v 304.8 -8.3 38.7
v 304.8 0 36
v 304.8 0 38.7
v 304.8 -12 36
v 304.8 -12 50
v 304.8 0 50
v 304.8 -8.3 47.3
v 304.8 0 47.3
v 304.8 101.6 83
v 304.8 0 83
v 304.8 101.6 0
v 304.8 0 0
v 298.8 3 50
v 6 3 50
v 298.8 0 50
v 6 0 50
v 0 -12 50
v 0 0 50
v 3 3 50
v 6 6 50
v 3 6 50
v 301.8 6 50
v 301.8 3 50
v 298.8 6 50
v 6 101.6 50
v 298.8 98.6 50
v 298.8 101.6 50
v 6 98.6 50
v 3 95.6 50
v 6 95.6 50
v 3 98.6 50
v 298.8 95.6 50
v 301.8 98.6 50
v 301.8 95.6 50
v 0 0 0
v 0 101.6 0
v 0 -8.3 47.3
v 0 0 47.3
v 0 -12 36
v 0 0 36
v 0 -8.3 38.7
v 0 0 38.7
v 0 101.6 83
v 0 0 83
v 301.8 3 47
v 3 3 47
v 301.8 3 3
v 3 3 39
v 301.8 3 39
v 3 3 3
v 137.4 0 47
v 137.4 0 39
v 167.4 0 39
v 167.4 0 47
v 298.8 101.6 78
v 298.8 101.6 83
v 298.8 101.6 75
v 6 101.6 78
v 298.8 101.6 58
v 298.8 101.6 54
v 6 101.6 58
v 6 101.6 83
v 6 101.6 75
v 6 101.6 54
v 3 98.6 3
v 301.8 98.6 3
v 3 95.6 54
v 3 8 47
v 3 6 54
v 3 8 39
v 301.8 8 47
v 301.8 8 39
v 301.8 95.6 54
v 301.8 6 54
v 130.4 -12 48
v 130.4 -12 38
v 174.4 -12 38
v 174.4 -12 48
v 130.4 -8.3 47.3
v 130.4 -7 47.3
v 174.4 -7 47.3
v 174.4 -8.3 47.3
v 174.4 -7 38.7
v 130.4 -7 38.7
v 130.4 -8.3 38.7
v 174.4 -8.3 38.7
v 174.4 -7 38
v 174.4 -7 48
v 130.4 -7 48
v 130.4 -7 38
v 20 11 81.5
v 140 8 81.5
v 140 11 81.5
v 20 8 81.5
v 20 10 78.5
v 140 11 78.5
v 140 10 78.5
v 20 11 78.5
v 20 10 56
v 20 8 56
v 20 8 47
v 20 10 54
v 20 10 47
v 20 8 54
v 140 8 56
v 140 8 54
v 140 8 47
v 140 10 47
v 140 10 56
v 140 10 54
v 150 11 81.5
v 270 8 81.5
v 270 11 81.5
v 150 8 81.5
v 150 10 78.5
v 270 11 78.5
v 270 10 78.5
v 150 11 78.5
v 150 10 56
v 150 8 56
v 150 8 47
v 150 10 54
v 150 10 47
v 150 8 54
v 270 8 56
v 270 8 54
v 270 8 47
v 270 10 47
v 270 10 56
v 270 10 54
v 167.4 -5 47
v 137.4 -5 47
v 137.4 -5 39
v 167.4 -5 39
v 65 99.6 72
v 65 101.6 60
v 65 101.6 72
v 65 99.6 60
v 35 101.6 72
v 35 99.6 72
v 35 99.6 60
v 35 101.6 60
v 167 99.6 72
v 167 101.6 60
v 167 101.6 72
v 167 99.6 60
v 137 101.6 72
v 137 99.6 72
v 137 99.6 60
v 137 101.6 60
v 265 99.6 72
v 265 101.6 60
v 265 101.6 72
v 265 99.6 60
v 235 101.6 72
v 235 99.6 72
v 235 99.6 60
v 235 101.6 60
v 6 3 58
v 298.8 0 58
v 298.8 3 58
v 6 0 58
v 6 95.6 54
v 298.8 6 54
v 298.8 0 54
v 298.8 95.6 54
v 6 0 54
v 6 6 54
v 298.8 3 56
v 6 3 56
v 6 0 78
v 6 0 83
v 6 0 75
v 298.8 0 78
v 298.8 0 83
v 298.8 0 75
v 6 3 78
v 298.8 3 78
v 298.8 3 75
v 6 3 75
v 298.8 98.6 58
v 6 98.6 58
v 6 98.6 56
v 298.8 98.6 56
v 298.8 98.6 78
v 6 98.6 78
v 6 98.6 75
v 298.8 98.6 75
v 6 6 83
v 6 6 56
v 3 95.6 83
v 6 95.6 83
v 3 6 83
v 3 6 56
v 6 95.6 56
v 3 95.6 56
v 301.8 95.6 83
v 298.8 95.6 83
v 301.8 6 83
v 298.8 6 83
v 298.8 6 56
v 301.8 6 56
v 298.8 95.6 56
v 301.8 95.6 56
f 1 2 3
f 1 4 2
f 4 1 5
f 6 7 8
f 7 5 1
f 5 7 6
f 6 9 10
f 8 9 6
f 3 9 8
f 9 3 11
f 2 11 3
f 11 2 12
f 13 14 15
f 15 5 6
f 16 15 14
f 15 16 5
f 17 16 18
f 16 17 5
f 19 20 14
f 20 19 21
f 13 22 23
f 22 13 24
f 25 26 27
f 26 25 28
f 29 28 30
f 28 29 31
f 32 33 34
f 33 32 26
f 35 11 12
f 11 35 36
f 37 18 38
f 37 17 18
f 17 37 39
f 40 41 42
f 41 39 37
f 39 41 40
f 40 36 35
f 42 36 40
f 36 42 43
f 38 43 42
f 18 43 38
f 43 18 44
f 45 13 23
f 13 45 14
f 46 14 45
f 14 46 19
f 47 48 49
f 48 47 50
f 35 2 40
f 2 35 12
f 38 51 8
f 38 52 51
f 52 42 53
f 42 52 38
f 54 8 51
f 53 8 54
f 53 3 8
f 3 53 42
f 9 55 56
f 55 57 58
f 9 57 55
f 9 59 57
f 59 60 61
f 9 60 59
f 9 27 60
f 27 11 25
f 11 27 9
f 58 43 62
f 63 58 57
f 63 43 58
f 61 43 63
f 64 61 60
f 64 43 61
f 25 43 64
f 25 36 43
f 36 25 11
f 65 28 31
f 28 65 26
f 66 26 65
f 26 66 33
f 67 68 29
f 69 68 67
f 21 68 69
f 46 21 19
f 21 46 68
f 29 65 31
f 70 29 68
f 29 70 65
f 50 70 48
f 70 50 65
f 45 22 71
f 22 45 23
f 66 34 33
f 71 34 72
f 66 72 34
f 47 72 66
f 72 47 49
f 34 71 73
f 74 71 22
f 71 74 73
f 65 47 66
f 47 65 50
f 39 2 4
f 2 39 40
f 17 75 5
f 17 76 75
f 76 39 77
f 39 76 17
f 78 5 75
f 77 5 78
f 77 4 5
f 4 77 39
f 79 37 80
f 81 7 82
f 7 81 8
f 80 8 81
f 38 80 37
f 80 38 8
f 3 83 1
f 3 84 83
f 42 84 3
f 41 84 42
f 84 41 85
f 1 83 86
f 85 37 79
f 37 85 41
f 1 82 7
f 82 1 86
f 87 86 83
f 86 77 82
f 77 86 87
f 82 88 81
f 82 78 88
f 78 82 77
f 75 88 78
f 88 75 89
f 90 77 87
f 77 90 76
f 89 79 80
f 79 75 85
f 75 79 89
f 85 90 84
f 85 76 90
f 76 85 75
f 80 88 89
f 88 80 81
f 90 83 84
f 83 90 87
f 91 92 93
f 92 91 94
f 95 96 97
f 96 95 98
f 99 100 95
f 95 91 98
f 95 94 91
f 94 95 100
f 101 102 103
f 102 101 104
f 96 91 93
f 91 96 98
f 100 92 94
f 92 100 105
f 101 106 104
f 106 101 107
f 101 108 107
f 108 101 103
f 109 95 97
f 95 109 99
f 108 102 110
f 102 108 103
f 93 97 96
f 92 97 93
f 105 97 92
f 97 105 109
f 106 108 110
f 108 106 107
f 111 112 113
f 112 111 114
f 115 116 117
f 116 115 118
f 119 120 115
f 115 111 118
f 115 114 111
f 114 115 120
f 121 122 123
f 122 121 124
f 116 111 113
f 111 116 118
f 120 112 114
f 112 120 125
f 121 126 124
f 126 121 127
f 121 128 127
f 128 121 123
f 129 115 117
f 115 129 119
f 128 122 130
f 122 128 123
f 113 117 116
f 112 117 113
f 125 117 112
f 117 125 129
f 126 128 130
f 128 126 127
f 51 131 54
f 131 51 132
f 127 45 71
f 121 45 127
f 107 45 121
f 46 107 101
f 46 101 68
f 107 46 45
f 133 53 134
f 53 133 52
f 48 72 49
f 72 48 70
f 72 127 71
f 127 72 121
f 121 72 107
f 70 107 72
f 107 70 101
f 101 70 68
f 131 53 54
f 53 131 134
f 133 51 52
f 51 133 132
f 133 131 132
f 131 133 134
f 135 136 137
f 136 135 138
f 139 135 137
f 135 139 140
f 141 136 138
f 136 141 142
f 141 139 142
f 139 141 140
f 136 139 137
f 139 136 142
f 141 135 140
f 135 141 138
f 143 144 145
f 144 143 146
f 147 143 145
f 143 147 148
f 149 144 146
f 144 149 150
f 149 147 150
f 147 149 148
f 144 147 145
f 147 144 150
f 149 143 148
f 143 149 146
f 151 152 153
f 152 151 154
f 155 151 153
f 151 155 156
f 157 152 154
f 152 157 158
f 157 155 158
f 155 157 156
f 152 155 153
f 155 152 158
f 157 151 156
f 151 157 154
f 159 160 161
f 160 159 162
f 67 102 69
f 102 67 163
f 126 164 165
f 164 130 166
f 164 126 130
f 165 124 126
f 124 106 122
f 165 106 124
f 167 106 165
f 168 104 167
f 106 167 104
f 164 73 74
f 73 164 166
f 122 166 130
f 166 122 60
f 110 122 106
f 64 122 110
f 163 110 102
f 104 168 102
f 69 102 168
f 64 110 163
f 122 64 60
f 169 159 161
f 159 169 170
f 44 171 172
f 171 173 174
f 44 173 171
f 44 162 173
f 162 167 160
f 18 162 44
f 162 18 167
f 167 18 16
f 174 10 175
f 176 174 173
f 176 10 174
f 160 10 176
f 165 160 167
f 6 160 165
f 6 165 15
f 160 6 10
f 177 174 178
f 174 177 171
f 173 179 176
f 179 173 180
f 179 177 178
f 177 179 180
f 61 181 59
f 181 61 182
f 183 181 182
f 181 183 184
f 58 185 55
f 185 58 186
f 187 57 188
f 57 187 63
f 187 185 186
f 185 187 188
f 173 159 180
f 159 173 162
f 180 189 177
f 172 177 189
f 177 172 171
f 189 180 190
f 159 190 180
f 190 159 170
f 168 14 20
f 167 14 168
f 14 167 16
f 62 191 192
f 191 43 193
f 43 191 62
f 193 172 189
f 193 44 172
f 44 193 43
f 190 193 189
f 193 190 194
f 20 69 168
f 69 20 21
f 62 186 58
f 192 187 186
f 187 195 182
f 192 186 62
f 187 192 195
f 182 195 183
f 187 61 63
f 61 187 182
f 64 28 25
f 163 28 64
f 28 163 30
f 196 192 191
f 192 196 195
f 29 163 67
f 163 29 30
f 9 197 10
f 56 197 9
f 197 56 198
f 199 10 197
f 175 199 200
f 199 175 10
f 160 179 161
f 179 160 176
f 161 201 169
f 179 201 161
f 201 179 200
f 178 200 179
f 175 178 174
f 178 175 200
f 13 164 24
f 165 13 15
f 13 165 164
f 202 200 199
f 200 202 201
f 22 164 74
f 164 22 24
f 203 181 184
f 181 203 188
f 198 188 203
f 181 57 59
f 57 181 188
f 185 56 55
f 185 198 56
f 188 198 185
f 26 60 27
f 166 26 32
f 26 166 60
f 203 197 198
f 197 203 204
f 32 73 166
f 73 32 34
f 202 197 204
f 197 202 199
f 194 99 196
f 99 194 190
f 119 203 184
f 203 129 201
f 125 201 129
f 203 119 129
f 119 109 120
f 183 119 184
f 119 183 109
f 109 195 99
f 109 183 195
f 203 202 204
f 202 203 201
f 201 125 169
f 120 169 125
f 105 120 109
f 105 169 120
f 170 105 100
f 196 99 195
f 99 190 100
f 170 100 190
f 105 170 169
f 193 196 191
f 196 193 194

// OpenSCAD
// file: ../top_ref.scad
// top_ref.scad  — FAITHFUL reference of the real uploaded top tray (L3.stl)
// Extracted from L3.stl by voxel analysis. Coordinates: new-tray top face = z=0 here,
// call top_ref(base=50) to seat it on a 50mm-tall new tray.
// DO NOT MODIFY THIS PART IN ANY DESIGN — it represents an already-printed tray.
//
// Real dims: 304.8 (X) x 101.6 (Y) x 33 (Z).
//  - END walls (short, x=0..3 and 301.8..304.8): SOLID full height -> top at z=33 (seated 83)
//  - LONG sides (front y=0..3, back y=98.6..101.6): OPEN FRAME
//        bottom rail z=4..8, top rail z=25..28, OPEN between (z=9..24)
//        side top edge at z=28 (seated 78)
//  - Corners: full height to z=33 (seated 83)
//  - Floor plate: z=4..6
// Seated mapping (base=50): add 50 to every z below.

TR_X = 304.8;
TR_Y = 101.6;
TR_Z = 33;
TR_wall = 3;        // side/end wall thickness
TR_endw = 3;        // short-end wall thickness
TR_botrail_z0 = 4;  TR_botrail_z1 = 8;     // long-side bottom rail
TR_toprail_z0 = 25; TR_toprail_z1 = 28;    // long-side top rail (side top edge=28)
TR_floor_z0 = 4;    TR_floor_z1 = 6;
TR_corner = 6;      // corner post footprint (x & y) kept full height

module top_ref(base=50, col="#90A4AE", alpha=1.0) {
    color(col, alpha)
    translate([0,0,base])
    union() {
        // ---- floor plate ----
        translate([TR_endw, TR_wall, TR_floor_z0])
            cube([TR_X-2*TR_endw, TR_Y-2*TR_wall, TR_floor_z1-TR_floor_z0]);
        // ---- two short END walls: full height ----
        cube([TR_endw, TR_Y, TR_Z]);
        translate([TR_X-TR_endw,0,0]) cube([TR_endw, TR_Y, TR_Z]);
        // ---- long-side OPEN FRAMES (front & back) ----
        for (yy=[0, TR_Y-TR_wall]) {
            // bottom rail
            translate([0, yy, TR_botrail_z0]) cube([TR_X, TR_wall, TR_botrail_z1-TR_botrail_z0]);
            // top rail (side top edge)
            translate([0, yy, TR_toprail_z0]) cube([TR_X, TR_wall, TR_toprail_z1-TR_toprail_z0]);
        }
        // ---- corner posts full height (tie frames together, reach z=33) ----
        for (xx=[0, TR_X-TR_corner], yy=[0, TR_Y-TR_corner])
            translate([xx,yy,0]) cube([TR_corner, TR_corner, TR_Z]);
    }
}

// Convenience constants a design can reference (seated, base=50):
//   END-wall top edge:        z = 50+33 = 83  (over the short ends -> strong clamp)
//   Long-side top rail top:   z = 50+28 = 78  (hook over / under along front)
//   Long-side open slot:      z = 50+9 .. 50+24 = 59..74 (reach a tongue in anywhere)
//   Corner top:               z = 83
// main file
// 01_pushbar.scad — Multipoint Push-Bar Slide-Bolt
// Place-then-secure: lower top tray straight down (loose, ~0.6mm), then push the
// front bar +Y to drive tongues ABOVE the front top-rail (seated z=75..78),
// blocking any lift once locked.
//
// Capture logic:
//   - Top tray front top-rail seated at y=0..3, z=75..78 (solid)
//   - Above the top rail at y=0..3, z=78..83 is EMPTY (between rail top and corner top)
//   - Tongue tip sits at z=78.5 (0.5mm clear of rail top) in that empty space
//   - On +2mm lift the top rail moves to z=77..80: tongue at z=78.5..80.5 overlaps
//   - In UNLOCKED: tongue retracts to y<0 (outside tray) → zero overlap

show  = "all";  // [all, new, top]
lock  = 1;      // 0=unlocked  1=locked

include <../top_ref.scad>

// ── Tray dims ──────────────────────────────────────────────────────────────
T_X   = 304.8;
T_Y   = 101.6;
T_Z   = 50;
T_W   = 3;

// ── Bar / housing ─────────────────────────────────────────────────────────
// Housing sits on the front face of the new tray (y=0..3 is the front wall)
// Housing block: y = -12..0,  z = 36..50
HSG_D    = 12;      // depth in -Y
HSG_H    = 14;      // height
HSG_Z0   = T_Z - HSG_H;     // = 36
BAR_D    = 8;       // bar depth in Y
BAR_H    = 8;       // bar height
BAR_CLR  = 0.3;     // print-in-place clearance
BAR_Z0   = HSG_Z0 + (HSG_H - BAR_H) / 2;  // = 39
BAR_TRAVEL = 8;     // mm of +Y push to lock

lock_dy  = lock ? BAR_TRAVEL : 0;

// ── Tongue geometry ────────────────────────────────────────────────────────
// The tongue is a thin vertical blade that rides on the bar.
// Stem (below tray top = z<50): stays at y=-12..bar_front → no overlap with top tray
// Cap (above tray top = z>50): extends from bar_front_y to y=T_W when locked
//
// CRITICAL: only the portion z > 78.5 is at y=0..T_W; the rest is at y<0.
// We split: "arm" connects bar to "cap".

TONG_CAP_Z0  = 78.5;    // bottom of cap (0.5mm clear of top rail top at z=78)
TONG_CAP_Z1  = 81.5;    // top of cap (below corner top z=83)
TONG_CAP_TH  = T_W;     // cap thickness in Y = 3mm (fills y=0..3 when locked)
TONG_CAP_W   = 60;      // each cap width in X

// In locked: bar front face at y = -BAR_D + BAR_TRAVEL = 0
// Cap at y = bar_front .. bar_front + TONG_CAP_TH = 0..3
// In unlocked: bar front at y = -BAR_D = -8
// Cap at y = -8..-5  → completely outside y=0..T_Y

// Four cap positions, away from corners (corner posts x=0..6 & x=298.8..304.8)
TONG_CX = [50, 110, 180, 240];

// ── End-cap hooks on bar (catch over short end wall top z=83) ─────────────
// Short-end walls: x=0..3 & x=301.8..304.8, solid to z=83
// Hook lip sits at z=83.5 when locked, in the same bar +Y slide
// (bar slides from y=HSG_D inward; at full lock, hook is at y=0..2)
// Hook dims:
HOOK_Z0  = 50;      // hook base (at new tray top)
HOOK_Z1  = 84.5;    // hook lip top (above end-wall top z=83)
HOOK_LIP = 1.5;     // lip overhang in +X / -X over end wall
HOOK_W   = 4;       // hook body width in X (sits just outside end wall)
HOOK_TH  = T_W;     // thickness in Y

// Arm (rises from bar top, stays at y<0 until locked)
// Arm goes from bar top (z=BAR_Z0+BAR_H=47) up to TONG_CAP_Z0=78.5
// Arm stays in Y: same as bar (retracts to y<0 when unlocked)
ARM_TH   = 2;       // arm thickness in Y

// ─────────────────────────────────────────────────────────────────────────
module new_tray() {
    color("#1565C0") {
        cube([T_X, T_W, T_Z]);                          // front wall
        translate([0, T_Y-T_W, 0]) cube([T_X, T_W, T_Z]);   // back wall
        cube([T_W, T_Y, T_Z]);                          // left wall
        translate([T_X-T_W, 0, 0]) cube([T_W, T_Y, T_Z]);   // right wall
        cube([T_X, T_Y, T_W]);                          // floor
    }
}

module housing_block() {
    // Shell, y=-HSG_D..0, z=HSG_Z0..T_Z
    color("#F9A825") {
        difference() {
            translate([0, -HSG_D, HSG_Z0]) cube([T_X, HSG_D, HSG_H]);
            // Bar channel (print-in-place)
            translate([-1, -BAR_D - BAR_CLR, BAR_Z0 - BAR_CLR])
                cube([T_X+2, BAR_D + BAR_CLR, BAR_H + 2*BAR_CLR]);
            // Finger opening in front face (centre span)
            translate([T_X/2 - 22, -HSG_D - 1, BAR_Z0 - 1])
                cube([44, 6, BAR_H + 2]);
        }
    }
}

module bar_with_tongues() {
    bar_y0 = -BAR_D + lock_dy;   // y of bar rear face
    bar_yf = bar_y0 + BAR_D;     // y of bar front face  (= lock_dy - 0 = 0 when locked)

    color("#C62828") {
        // ── Bar body ──
        translate([0, bar_y0, BAR_Z0])
            cube([T_X, BAR_D, BAR_H]);

        // ── Tongue caps: only at z=78.5..81.5, positioned at bar front face ──
        for (cx = TONG_CX) {
            tx0 = cx - TONG_CAP_W/2;
            tx1 = cx + TONG_CAP_W/2;
            tx0c = max(tx0, 7);
            tx1c = min(tx1, 297.8);
            tw   = tx1c - tx0c;
            if (tw > 5) {
                // Cap: at bar front face, extending +Y by TONG_CAP_TH
                // z = TONG_CAP_Z0..TONG_CAP_Z1
                translate([tx0c, bar_yf, TONG_CAP_Z0])
                    cube([tw, TONG_CAP_TH, TONG_CAP_Z1 - TONG_CAP_Z0]);
                // Arm: connects bar top (z=BAR_Z0+BAR_H) up to cap bottom
                // Arm at bar front face position, ARM_TH thick
                translate([tx0c, bar_yf, BAR_Z0 + BAR_H])
                    cube([tw, ARM_TH, TONG_CAP_Z0 - (BAR_Z0 + BAR_H)]);
            }
        }

        // ── Finger tab ──
        translate([T_X/2 - 15, bar_y0 - 5, BAR_Z0])
            cube([30, 5, BAR_H]);
    }
}

module back_passive_rail() {
    // Passive Y-capture: 2mm rail flush with back face (y=101.6)
    // Sits in back open slot (y=98.6..101.6, z=59..74 — empty)
    // Does not extend past y=101.6
    color("#F9A825") {
        for (cx = [50, 152, 250]) {
            translate([cx - 15, T_Y - 2, 60])
                cube([30, 2, 12]);
        }
    }
}

module new_assembly(lk) {
    new_tray();
    housing_block();
    bar_with_tongues();
    back_passive_rail();
}

if (show != "top") new_assembly(lock);
if (show != "new") top_ref(50);
